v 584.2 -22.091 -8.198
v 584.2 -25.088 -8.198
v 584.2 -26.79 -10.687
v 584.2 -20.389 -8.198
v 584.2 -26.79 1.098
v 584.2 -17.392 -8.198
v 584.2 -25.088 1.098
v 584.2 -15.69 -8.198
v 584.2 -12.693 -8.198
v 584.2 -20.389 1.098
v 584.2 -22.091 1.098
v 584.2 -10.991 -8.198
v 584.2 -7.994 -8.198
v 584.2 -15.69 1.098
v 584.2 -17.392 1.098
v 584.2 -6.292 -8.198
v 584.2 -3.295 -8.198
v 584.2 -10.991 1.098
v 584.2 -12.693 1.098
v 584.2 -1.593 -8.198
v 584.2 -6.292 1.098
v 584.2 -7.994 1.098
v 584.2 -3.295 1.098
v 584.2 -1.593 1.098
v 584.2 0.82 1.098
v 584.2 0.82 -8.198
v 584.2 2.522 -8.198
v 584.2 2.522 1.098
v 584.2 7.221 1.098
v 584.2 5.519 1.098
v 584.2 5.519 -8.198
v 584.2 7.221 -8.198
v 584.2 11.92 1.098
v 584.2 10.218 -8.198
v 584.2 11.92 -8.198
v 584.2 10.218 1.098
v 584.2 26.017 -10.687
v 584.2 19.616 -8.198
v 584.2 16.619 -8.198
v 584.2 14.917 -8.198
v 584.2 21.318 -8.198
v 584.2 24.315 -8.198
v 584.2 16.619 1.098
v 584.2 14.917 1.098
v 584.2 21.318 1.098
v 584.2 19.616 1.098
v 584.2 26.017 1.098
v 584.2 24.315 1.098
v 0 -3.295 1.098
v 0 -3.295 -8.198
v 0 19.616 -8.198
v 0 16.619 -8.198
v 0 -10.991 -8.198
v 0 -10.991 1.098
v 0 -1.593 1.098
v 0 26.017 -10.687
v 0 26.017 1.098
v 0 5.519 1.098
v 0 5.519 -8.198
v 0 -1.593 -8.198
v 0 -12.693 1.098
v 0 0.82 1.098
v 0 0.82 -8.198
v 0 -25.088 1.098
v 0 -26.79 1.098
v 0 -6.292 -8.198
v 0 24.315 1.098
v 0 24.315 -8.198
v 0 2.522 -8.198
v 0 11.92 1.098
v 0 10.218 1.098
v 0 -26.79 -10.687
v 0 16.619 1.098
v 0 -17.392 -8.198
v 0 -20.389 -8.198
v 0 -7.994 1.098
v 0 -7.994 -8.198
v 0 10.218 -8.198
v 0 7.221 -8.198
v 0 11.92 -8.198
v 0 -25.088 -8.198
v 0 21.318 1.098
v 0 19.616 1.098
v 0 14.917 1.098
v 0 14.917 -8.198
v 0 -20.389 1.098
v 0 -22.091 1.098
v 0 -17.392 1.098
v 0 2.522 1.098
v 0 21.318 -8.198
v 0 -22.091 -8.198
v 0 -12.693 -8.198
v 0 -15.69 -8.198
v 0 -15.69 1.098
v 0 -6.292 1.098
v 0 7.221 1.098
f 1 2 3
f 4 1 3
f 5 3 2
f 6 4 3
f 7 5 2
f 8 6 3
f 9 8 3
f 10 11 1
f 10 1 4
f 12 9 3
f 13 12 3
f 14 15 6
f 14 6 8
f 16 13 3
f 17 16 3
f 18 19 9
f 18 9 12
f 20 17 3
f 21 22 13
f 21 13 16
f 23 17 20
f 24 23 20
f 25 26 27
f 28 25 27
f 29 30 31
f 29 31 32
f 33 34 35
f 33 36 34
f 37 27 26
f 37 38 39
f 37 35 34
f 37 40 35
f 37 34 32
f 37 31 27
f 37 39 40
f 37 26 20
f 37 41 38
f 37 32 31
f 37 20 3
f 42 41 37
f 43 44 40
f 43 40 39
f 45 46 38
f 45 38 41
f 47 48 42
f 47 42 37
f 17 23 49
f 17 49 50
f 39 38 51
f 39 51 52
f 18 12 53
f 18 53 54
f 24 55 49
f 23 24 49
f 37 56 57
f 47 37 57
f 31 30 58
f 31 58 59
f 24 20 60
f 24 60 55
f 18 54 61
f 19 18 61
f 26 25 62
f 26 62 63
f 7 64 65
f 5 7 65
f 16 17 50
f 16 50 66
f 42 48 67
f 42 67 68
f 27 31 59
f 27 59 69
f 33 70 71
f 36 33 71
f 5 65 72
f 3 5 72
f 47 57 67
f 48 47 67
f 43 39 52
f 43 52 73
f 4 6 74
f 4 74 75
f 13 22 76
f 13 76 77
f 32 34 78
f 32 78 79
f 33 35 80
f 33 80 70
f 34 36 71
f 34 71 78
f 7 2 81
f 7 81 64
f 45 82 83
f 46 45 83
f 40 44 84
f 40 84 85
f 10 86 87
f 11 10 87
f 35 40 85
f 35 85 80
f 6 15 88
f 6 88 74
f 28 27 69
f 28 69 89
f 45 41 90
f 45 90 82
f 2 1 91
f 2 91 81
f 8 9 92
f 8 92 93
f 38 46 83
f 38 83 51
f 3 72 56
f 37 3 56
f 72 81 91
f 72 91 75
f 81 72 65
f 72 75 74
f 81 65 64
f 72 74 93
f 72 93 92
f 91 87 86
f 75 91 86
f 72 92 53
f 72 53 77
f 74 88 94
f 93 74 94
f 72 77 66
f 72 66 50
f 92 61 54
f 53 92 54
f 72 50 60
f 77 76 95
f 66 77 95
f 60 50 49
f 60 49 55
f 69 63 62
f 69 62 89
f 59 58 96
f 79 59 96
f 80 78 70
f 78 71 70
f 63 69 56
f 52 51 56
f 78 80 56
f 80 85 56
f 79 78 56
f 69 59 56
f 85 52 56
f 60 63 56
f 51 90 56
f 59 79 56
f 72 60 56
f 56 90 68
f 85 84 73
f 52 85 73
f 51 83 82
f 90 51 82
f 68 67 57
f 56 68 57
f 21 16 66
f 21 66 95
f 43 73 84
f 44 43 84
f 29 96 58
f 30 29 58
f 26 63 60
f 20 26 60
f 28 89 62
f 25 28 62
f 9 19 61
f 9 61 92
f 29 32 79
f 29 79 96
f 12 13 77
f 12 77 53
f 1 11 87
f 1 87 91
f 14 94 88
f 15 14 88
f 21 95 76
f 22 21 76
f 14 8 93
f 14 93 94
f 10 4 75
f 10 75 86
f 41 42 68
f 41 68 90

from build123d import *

# Parameters (mm, degrees)
F1_DEPTH = 584.2


with BuildPart() as f1:
    # F0 (on Right) → F1 (new body)
    with BuildSketch(Plane.YZ):
        Polygon((-25.088021, 1.09811), (-26.789821, 1.09811), (-26.789821, -10.68749), (26.016779, -10.68749), (26.016779, 1.09811), (24.314979, 1.09811), (24.314979, -8.19829), (21.317779, -8.19829), (21.317779, 1.09811), (19.615979, 1.09811), (19.615979, -8.19829), (16.618779, -8.19829), (16.618779, 1.09811), (14.916979, 1.09811), (14.916979, -8.19829), (11.919779, -8.19829), (11.919779, 1.09811), (10.217979, 1.09811), (10.217979, -8.19829), (7.220779, -8.19829), (7.220779, 1.09811), (5.518979, 1.09811), (5.518979, -8.19829), (2.521779, -8.19829), (2.521779, 1.09811), (0.819979, 1.09811), (0.819979, -8.19829), (-1.593021, -8.19829), (-1.593021, 1.09811), (-3.294821, 1.09811), (-3.294821, -8.19829), (-6.292021, -8.19829), (-6.292021, 1.09811), (-7.993821, 1.09811), (-7.993821, -8.19829), (-10.991021, -8.19829), (-10.991021, 1.09811), (-12.692821, 1.09811), (-12.692821, -8.19829), (-15.690021, -8.19829), (-15.690021, 1.09811), (-17.391821, 1.09811), (-17.391821, -8.19829), (-20.389021, -8.19829), (-20.389021, 1.09811), (-22.090821, 1.09811), (-22.090821, -8.19829), (-25.088021, -8.19829), align=None)
    extrude(amount=F1_DEPTH)


solid = f1.part
